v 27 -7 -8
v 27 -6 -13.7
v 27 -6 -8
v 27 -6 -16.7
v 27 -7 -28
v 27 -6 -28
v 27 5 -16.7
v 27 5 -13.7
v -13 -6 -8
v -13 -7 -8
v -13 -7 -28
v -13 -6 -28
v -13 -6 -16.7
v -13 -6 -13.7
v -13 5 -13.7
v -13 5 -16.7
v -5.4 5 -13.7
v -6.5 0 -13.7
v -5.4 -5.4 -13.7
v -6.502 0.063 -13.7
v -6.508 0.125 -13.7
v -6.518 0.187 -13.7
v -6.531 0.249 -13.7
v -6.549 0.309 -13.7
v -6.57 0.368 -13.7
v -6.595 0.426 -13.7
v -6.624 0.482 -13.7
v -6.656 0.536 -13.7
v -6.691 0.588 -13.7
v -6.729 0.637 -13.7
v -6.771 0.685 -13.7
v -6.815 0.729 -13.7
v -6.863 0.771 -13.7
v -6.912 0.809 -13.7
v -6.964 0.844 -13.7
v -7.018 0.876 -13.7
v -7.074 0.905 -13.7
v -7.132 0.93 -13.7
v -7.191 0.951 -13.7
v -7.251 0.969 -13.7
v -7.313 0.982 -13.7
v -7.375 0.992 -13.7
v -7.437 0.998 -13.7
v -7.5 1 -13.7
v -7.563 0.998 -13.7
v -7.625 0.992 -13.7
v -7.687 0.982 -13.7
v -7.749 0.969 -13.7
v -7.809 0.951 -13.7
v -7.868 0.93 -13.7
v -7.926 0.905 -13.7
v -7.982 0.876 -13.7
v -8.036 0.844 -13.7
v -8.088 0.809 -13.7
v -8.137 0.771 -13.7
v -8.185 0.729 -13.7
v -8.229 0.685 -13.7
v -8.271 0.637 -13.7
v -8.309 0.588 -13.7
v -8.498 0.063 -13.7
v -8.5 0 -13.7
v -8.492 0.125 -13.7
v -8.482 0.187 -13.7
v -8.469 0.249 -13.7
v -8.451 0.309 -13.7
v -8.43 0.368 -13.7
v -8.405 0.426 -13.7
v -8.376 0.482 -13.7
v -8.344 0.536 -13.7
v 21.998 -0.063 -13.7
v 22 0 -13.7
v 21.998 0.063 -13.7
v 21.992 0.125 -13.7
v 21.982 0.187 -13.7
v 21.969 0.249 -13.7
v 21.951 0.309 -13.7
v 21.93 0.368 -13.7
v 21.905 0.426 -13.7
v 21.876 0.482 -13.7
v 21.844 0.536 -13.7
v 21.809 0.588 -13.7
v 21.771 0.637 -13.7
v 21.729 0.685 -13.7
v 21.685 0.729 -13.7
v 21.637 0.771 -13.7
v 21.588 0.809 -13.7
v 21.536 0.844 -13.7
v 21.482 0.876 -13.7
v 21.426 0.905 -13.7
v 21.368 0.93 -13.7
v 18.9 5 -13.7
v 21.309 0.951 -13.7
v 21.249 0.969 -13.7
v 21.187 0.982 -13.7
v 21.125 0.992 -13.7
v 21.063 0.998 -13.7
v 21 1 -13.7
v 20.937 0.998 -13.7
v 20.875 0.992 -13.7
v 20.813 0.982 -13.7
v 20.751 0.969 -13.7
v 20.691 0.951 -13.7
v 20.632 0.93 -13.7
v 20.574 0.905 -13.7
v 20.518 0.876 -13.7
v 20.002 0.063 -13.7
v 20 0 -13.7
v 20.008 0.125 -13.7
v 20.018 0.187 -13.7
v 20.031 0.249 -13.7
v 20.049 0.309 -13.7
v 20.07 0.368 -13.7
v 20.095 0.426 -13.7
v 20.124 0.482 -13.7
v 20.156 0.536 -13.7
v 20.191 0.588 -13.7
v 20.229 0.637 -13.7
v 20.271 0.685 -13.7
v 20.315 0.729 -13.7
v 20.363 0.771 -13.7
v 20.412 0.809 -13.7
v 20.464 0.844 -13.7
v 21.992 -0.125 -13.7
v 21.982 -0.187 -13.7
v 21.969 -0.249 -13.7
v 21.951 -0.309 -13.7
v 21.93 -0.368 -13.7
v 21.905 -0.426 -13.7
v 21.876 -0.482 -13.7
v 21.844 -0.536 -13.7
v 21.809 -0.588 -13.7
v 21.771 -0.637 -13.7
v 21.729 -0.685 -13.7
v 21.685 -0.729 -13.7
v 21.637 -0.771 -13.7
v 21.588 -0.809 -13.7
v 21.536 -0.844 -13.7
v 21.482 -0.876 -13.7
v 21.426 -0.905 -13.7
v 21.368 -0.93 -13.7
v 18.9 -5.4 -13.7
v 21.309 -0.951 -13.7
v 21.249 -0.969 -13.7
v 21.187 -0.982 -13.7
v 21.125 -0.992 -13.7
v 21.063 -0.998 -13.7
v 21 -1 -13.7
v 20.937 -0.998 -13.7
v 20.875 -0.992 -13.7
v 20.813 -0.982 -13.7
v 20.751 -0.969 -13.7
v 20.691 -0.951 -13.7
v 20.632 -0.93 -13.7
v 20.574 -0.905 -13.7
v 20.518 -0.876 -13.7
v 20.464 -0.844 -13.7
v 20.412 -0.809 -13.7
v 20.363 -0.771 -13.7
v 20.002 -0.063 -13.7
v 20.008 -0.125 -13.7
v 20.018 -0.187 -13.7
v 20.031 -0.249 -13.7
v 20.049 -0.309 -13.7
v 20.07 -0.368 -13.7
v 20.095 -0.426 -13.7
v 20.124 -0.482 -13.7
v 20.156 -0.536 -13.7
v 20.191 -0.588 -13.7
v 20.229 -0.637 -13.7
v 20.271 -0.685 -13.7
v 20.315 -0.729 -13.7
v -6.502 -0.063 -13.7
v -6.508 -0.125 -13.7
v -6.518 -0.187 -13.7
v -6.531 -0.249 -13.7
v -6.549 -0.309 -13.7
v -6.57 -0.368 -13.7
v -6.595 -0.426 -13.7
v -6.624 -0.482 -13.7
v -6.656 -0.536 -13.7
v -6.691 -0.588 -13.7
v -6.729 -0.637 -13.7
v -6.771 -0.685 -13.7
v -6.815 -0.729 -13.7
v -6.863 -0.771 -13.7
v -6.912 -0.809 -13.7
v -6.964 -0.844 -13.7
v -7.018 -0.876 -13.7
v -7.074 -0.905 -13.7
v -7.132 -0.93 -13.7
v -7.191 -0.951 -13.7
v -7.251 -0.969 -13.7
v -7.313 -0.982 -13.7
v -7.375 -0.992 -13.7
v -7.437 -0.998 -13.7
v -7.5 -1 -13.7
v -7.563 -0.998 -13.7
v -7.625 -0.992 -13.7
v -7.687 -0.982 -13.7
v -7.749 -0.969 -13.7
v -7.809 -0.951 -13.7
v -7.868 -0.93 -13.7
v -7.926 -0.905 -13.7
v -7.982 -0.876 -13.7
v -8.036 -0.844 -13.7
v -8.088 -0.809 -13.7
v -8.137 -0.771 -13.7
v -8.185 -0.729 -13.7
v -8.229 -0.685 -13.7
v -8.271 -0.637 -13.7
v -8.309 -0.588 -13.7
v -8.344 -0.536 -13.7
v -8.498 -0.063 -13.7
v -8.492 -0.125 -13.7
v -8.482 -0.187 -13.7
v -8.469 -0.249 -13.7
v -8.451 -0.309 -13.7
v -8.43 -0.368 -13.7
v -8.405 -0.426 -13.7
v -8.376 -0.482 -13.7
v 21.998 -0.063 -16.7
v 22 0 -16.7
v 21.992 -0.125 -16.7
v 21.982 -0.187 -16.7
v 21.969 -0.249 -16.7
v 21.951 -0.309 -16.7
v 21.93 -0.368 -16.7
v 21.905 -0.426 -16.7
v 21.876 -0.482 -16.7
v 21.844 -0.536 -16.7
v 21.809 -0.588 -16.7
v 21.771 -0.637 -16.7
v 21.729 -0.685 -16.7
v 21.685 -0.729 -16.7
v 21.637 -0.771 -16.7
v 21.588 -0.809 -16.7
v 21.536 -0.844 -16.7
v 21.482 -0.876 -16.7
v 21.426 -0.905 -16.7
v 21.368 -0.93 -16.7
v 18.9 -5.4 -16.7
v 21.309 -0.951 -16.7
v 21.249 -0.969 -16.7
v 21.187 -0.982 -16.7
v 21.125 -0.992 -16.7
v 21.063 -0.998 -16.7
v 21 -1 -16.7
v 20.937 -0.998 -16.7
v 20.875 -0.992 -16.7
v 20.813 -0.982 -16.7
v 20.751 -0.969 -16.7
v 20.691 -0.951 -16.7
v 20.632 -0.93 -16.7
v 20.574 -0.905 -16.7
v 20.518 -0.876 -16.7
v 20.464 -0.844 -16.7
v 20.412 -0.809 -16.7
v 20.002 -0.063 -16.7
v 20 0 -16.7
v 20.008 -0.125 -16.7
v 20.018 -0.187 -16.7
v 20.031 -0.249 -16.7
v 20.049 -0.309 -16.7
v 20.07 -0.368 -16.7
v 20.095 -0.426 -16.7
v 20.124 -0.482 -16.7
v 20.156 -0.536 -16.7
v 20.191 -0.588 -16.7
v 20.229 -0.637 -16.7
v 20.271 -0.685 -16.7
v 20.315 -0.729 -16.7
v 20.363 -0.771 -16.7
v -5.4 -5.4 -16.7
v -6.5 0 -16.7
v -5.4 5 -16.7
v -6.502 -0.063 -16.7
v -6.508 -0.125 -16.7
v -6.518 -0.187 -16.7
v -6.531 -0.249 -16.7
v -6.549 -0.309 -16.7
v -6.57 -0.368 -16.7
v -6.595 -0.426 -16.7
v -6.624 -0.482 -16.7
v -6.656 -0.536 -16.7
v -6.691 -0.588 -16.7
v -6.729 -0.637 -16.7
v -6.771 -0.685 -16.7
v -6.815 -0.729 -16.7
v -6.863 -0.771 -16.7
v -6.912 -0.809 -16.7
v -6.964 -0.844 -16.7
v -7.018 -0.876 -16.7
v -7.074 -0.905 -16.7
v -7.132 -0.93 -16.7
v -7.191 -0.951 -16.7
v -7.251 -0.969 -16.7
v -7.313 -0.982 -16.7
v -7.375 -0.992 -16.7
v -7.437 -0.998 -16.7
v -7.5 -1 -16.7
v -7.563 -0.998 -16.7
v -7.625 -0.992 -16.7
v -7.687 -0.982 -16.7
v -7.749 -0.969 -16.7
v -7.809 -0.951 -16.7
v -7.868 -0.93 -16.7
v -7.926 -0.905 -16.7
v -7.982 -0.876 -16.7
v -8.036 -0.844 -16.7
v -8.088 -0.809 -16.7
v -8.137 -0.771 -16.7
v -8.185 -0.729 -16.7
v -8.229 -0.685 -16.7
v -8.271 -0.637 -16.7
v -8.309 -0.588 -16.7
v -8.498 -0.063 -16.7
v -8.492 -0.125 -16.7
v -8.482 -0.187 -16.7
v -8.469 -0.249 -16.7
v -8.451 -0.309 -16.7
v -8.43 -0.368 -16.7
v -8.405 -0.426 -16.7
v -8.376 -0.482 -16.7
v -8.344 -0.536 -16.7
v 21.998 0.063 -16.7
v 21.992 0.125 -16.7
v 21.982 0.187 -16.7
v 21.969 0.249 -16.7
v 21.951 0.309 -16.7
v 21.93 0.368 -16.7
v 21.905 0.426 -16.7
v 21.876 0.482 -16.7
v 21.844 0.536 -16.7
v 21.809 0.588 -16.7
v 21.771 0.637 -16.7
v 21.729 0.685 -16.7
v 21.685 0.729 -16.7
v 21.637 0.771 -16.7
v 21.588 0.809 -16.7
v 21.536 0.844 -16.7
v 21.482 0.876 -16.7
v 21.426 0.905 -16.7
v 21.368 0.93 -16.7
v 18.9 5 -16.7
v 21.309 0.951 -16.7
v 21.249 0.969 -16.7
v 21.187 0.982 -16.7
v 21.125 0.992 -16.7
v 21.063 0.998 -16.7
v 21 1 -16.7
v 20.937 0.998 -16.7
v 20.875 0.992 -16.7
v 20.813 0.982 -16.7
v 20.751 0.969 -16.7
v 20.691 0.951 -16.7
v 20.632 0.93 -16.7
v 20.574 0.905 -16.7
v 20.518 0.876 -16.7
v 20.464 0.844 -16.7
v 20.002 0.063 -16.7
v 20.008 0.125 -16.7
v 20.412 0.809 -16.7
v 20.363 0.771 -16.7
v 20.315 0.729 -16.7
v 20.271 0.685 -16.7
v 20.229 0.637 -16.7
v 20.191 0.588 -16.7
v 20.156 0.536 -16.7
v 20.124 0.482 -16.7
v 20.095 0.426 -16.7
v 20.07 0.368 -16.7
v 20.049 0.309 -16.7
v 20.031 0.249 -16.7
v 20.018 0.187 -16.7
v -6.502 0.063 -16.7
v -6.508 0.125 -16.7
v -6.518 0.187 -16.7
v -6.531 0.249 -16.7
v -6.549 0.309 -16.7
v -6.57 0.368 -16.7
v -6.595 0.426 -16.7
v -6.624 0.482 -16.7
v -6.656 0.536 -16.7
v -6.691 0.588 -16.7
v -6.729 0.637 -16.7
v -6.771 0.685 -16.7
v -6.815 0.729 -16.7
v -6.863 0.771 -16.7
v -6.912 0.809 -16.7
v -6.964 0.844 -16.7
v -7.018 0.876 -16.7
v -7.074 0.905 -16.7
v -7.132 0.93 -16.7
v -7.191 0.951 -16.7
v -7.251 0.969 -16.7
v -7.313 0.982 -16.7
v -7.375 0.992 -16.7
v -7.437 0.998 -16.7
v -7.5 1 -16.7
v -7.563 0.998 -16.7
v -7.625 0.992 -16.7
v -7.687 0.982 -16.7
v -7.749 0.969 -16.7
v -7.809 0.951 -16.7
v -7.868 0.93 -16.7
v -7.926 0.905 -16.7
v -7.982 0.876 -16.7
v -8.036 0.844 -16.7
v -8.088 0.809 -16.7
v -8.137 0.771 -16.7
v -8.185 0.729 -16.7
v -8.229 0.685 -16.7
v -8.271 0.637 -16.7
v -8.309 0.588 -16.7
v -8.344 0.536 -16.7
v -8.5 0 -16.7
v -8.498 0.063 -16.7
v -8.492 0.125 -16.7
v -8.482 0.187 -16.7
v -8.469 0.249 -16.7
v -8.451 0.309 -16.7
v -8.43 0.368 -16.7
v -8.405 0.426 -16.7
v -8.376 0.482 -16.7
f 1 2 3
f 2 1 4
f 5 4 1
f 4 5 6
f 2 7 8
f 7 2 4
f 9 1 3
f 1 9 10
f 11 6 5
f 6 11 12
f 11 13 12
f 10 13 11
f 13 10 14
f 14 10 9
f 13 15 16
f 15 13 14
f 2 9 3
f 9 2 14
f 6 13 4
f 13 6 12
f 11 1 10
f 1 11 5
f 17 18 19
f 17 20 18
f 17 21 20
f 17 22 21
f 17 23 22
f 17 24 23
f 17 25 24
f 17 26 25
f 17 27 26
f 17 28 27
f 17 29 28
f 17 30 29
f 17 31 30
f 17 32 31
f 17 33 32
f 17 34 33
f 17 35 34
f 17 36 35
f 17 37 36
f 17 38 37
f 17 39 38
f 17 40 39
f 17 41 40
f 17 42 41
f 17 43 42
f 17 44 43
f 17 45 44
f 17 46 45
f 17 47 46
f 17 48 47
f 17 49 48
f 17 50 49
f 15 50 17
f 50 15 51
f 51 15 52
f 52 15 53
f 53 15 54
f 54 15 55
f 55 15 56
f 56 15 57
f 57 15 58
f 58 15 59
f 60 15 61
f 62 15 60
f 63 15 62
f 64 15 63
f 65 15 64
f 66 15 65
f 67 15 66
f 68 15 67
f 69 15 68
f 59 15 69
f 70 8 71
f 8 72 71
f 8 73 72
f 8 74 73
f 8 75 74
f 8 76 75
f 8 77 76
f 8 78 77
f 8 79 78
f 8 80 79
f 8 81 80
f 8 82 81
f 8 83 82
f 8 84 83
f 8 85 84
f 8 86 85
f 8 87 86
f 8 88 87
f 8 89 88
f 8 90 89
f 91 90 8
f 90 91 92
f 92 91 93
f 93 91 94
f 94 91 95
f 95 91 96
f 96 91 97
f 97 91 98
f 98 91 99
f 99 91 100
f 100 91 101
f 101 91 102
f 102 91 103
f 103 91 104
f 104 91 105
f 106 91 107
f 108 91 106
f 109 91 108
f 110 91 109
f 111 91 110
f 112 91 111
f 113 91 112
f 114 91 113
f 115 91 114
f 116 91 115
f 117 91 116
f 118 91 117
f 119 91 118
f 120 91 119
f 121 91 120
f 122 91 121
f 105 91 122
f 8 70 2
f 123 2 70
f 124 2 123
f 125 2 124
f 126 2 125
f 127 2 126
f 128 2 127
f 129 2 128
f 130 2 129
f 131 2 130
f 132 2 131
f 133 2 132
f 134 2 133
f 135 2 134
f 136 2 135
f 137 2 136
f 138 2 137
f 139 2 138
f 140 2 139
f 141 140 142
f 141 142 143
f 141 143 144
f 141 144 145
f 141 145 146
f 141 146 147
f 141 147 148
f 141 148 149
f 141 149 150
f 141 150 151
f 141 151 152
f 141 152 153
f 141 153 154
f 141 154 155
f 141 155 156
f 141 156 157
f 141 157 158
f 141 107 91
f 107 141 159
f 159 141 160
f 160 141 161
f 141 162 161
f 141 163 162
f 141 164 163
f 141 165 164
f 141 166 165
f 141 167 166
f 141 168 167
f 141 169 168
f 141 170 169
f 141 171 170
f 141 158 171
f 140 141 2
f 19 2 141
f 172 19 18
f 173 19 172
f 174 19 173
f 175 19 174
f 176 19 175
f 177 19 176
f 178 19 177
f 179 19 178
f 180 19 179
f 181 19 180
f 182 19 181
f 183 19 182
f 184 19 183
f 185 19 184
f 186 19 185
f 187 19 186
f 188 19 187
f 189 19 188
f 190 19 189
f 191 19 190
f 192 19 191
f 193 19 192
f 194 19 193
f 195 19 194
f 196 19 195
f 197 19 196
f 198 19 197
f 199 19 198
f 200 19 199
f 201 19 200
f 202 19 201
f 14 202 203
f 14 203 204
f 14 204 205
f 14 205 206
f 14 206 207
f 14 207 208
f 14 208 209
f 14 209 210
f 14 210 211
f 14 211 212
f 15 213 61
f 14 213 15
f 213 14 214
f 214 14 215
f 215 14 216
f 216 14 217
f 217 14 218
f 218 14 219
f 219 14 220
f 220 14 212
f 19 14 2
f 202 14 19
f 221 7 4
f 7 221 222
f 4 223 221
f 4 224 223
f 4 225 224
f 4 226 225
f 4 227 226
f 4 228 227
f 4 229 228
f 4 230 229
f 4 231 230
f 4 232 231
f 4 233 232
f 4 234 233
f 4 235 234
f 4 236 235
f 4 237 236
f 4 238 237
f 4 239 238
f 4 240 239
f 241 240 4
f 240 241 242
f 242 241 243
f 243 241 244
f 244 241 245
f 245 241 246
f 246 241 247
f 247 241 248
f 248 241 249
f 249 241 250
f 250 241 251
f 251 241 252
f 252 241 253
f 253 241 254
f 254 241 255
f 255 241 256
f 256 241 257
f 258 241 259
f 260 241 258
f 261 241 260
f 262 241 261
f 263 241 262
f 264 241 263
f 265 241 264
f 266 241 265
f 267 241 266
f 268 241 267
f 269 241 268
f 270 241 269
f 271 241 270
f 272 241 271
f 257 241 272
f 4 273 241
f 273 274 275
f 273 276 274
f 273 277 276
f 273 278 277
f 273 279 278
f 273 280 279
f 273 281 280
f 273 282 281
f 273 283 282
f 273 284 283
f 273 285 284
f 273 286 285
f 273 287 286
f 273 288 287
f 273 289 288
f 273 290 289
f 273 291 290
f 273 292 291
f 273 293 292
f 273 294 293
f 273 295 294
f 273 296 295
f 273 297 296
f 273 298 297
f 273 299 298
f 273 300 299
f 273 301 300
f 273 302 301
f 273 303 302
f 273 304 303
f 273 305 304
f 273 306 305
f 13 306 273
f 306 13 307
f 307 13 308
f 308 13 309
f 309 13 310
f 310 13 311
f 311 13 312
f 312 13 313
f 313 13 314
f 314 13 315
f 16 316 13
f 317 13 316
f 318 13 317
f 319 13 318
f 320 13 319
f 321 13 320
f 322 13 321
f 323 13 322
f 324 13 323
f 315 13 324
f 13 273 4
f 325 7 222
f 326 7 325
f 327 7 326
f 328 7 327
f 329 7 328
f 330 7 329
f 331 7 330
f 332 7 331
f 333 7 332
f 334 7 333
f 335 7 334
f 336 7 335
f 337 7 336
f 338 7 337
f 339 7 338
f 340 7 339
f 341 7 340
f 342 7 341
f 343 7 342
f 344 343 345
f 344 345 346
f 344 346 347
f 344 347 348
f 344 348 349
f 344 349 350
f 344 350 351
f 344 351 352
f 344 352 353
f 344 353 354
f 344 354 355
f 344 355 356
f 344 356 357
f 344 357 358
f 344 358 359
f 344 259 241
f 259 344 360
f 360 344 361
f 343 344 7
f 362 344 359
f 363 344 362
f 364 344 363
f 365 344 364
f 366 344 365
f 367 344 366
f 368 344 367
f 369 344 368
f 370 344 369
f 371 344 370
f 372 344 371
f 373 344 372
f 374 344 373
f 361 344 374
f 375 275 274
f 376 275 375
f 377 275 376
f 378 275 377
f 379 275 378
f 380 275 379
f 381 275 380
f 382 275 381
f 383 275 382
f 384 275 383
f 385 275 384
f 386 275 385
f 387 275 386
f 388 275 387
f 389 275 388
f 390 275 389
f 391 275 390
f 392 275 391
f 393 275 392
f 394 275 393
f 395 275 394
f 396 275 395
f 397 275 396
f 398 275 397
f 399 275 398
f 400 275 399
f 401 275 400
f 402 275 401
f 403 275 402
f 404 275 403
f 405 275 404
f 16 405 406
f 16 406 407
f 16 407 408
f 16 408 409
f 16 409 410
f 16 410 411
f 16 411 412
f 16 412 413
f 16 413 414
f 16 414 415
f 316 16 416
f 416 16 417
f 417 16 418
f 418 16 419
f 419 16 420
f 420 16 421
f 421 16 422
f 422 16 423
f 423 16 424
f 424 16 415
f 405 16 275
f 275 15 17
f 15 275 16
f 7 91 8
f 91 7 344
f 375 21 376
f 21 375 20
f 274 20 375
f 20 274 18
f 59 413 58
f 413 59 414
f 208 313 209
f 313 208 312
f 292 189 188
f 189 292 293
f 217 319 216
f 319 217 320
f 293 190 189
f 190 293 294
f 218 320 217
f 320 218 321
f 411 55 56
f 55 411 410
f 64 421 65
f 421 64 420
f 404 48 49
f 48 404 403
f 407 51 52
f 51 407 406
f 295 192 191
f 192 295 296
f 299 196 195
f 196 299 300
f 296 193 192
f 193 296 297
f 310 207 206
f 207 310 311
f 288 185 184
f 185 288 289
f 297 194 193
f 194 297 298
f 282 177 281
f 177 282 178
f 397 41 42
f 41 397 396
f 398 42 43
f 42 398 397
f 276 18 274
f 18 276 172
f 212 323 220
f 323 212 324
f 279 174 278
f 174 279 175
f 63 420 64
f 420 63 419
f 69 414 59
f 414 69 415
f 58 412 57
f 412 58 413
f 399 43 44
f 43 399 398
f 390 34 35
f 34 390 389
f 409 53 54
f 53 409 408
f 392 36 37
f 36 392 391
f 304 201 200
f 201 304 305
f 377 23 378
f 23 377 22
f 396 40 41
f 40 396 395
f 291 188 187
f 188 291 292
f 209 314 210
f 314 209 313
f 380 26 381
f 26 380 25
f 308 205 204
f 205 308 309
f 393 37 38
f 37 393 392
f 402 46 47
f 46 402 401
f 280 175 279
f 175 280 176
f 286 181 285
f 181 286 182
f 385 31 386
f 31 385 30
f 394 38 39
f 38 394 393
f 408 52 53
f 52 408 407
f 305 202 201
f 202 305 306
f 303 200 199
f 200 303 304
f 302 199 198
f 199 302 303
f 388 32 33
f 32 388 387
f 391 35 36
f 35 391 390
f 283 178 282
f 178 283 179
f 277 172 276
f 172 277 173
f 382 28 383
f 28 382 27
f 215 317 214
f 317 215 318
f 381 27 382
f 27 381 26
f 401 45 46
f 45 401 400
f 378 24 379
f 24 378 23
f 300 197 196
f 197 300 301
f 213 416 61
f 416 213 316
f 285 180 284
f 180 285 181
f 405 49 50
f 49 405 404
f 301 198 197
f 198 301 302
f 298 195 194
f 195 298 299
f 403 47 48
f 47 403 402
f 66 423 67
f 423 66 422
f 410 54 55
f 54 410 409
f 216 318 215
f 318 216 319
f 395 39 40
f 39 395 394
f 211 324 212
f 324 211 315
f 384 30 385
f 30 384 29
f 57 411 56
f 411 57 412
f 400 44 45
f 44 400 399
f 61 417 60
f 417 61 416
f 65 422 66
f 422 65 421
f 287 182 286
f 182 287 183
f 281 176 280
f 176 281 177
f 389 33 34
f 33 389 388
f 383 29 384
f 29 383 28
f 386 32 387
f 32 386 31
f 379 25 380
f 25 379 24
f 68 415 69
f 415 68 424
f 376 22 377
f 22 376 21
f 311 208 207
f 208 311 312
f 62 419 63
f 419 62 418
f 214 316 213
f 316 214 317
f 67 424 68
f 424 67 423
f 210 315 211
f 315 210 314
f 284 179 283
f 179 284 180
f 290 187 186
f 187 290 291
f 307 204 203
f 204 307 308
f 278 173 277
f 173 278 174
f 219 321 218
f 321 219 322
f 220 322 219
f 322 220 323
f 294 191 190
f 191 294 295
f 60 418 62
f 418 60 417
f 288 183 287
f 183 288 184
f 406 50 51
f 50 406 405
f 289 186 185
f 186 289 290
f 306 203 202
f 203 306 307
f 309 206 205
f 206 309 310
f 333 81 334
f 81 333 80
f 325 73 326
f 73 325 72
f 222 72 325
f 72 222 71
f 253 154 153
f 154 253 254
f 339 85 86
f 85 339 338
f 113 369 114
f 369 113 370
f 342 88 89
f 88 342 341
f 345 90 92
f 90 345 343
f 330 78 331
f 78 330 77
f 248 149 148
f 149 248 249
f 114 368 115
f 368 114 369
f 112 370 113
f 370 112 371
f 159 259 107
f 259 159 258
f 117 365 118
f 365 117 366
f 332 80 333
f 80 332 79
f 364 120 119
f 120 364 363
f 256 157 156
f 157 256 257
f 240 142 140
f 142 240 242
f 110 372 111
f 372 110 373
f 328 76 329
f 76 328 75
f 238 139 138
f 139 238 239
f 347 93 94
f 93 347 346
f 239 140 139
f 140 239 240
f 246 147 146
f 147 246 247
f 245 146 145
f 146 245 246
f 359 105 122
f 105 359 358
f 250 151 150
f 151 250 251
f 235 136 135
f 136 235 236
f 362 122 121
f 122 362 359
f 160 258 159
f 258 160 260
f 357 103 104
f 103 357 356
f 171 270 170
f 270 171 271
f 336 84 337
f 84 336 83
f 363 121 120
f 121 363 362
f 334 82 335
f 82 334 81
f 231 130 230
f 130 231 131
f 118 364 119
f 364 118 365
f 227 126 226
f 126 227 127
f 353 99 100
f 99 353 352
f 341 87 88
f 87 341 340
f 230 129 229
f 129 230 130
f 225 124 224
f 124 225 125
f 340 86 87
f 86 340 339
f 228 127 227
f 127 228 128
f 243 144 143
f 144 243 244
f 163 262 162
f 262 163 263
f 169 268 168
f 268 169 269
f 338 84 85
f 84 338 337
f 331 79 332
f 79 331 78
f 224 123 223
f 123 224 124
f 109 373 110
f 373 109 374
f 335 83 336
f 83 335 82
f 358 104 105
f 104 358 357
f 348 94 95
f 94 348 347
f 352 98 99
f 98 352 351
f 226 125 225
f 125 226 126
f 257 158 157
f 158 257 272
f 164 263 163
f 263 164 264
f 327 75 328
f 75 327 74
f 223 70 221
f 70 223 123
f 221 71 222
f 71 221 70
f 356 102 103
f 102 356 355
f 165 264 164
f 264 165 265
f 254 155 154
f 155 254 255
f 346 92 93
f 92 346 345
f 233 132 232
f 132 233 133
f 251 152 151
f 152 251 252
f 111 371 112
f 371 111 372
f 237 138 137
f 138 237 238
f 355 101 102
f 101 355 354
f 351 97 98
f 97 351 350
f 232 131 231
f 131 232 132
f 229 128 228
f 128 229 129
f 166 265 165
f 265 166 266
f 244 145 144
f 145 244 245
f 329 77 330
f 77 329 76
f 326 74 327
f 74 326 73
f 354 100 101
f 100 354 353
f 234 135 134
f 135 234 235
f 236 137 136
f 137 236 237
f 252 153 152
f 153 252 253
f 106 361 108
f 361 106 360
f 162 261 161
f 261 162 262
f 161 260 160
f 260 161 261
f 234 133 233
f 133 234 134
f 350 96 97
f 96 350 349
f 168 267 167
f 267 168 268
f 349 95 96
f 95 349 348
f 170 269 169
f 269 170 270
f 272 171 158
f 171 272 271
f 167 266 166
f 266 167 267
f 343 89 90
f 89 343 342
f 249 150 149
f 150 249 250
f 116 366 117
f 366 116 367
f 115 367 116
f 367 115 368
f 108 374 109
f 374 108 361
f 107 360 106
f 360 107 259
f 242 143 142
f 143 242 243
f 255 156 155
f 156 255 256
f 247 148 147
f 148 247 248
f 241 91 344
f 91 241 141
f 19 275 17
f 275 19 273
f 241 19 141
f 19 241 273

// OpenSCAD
// file: utils.scad
module drawComponents() {
    difference() {
        union() {
            let ($componentMode = 0) {
                children();
            }
        }

        let ($componentMode = 1) {
            children();
        }
    }

    let ($componentMode = 2) {
        %children();
    }
}
// main file
use <utils.scad>

$fn = 100;


module servo() {
    printMargin = $componentMode == 2 ? 0  : 0.8;
    printMargin_2 = $componentMode == 2 ? 0  : 0.4;

    if ($componentMode == 1) {
        translate([11.75 - 5, 0, -26]) {
            translate([-14.25, 0, 7])
                cylinder(8, 1, 1);

            translate([14.25, 0, 7])
                cylinder(8, 1, 1);

        }
    } else if ($componentMode == 2) {

        difference() {
            union() {
                translate([0, 0, -8.5])
                    cylinder(8.5, 3.7 / 2, 3.7 / 2);
                
                translate([0, 0, -10])
                    cylinder(5, 5, 5);

                translate([6, 0, -10])
                    cylinder(4.2, 2.5, 2.5);

                translate([-(32 - 23.5)/2 - 5, -5, -13.7])
                    cube([32, 10, 2]);
            }

            translate([11.75 - 5, 0, -26]) {
                translate([-14.25, 0, 7])
                    cylinder(8, 1, 1);

                translate([14.25, 0, 7])
                    cylinder(8, 1, 1);

            }

        }

    }

    if ($componentMode == 2 || $componentMode == 1) {
         translate([-5, 0, -8.5])
            translate([-printMargin_2, -5 - printMargin_2, -18])
                cube([23.5 + printMargin, 10 + printMargin, 18]);

    }
}


drawComponents() {
    servo();

    if ($componentMode == 0) {
        translate([-13 ,-7, -28])
            cube([40, 1, 20]);

        translate([-13 ,-6, -16.7])
            cube([40, 11, 3]);

    }
}
